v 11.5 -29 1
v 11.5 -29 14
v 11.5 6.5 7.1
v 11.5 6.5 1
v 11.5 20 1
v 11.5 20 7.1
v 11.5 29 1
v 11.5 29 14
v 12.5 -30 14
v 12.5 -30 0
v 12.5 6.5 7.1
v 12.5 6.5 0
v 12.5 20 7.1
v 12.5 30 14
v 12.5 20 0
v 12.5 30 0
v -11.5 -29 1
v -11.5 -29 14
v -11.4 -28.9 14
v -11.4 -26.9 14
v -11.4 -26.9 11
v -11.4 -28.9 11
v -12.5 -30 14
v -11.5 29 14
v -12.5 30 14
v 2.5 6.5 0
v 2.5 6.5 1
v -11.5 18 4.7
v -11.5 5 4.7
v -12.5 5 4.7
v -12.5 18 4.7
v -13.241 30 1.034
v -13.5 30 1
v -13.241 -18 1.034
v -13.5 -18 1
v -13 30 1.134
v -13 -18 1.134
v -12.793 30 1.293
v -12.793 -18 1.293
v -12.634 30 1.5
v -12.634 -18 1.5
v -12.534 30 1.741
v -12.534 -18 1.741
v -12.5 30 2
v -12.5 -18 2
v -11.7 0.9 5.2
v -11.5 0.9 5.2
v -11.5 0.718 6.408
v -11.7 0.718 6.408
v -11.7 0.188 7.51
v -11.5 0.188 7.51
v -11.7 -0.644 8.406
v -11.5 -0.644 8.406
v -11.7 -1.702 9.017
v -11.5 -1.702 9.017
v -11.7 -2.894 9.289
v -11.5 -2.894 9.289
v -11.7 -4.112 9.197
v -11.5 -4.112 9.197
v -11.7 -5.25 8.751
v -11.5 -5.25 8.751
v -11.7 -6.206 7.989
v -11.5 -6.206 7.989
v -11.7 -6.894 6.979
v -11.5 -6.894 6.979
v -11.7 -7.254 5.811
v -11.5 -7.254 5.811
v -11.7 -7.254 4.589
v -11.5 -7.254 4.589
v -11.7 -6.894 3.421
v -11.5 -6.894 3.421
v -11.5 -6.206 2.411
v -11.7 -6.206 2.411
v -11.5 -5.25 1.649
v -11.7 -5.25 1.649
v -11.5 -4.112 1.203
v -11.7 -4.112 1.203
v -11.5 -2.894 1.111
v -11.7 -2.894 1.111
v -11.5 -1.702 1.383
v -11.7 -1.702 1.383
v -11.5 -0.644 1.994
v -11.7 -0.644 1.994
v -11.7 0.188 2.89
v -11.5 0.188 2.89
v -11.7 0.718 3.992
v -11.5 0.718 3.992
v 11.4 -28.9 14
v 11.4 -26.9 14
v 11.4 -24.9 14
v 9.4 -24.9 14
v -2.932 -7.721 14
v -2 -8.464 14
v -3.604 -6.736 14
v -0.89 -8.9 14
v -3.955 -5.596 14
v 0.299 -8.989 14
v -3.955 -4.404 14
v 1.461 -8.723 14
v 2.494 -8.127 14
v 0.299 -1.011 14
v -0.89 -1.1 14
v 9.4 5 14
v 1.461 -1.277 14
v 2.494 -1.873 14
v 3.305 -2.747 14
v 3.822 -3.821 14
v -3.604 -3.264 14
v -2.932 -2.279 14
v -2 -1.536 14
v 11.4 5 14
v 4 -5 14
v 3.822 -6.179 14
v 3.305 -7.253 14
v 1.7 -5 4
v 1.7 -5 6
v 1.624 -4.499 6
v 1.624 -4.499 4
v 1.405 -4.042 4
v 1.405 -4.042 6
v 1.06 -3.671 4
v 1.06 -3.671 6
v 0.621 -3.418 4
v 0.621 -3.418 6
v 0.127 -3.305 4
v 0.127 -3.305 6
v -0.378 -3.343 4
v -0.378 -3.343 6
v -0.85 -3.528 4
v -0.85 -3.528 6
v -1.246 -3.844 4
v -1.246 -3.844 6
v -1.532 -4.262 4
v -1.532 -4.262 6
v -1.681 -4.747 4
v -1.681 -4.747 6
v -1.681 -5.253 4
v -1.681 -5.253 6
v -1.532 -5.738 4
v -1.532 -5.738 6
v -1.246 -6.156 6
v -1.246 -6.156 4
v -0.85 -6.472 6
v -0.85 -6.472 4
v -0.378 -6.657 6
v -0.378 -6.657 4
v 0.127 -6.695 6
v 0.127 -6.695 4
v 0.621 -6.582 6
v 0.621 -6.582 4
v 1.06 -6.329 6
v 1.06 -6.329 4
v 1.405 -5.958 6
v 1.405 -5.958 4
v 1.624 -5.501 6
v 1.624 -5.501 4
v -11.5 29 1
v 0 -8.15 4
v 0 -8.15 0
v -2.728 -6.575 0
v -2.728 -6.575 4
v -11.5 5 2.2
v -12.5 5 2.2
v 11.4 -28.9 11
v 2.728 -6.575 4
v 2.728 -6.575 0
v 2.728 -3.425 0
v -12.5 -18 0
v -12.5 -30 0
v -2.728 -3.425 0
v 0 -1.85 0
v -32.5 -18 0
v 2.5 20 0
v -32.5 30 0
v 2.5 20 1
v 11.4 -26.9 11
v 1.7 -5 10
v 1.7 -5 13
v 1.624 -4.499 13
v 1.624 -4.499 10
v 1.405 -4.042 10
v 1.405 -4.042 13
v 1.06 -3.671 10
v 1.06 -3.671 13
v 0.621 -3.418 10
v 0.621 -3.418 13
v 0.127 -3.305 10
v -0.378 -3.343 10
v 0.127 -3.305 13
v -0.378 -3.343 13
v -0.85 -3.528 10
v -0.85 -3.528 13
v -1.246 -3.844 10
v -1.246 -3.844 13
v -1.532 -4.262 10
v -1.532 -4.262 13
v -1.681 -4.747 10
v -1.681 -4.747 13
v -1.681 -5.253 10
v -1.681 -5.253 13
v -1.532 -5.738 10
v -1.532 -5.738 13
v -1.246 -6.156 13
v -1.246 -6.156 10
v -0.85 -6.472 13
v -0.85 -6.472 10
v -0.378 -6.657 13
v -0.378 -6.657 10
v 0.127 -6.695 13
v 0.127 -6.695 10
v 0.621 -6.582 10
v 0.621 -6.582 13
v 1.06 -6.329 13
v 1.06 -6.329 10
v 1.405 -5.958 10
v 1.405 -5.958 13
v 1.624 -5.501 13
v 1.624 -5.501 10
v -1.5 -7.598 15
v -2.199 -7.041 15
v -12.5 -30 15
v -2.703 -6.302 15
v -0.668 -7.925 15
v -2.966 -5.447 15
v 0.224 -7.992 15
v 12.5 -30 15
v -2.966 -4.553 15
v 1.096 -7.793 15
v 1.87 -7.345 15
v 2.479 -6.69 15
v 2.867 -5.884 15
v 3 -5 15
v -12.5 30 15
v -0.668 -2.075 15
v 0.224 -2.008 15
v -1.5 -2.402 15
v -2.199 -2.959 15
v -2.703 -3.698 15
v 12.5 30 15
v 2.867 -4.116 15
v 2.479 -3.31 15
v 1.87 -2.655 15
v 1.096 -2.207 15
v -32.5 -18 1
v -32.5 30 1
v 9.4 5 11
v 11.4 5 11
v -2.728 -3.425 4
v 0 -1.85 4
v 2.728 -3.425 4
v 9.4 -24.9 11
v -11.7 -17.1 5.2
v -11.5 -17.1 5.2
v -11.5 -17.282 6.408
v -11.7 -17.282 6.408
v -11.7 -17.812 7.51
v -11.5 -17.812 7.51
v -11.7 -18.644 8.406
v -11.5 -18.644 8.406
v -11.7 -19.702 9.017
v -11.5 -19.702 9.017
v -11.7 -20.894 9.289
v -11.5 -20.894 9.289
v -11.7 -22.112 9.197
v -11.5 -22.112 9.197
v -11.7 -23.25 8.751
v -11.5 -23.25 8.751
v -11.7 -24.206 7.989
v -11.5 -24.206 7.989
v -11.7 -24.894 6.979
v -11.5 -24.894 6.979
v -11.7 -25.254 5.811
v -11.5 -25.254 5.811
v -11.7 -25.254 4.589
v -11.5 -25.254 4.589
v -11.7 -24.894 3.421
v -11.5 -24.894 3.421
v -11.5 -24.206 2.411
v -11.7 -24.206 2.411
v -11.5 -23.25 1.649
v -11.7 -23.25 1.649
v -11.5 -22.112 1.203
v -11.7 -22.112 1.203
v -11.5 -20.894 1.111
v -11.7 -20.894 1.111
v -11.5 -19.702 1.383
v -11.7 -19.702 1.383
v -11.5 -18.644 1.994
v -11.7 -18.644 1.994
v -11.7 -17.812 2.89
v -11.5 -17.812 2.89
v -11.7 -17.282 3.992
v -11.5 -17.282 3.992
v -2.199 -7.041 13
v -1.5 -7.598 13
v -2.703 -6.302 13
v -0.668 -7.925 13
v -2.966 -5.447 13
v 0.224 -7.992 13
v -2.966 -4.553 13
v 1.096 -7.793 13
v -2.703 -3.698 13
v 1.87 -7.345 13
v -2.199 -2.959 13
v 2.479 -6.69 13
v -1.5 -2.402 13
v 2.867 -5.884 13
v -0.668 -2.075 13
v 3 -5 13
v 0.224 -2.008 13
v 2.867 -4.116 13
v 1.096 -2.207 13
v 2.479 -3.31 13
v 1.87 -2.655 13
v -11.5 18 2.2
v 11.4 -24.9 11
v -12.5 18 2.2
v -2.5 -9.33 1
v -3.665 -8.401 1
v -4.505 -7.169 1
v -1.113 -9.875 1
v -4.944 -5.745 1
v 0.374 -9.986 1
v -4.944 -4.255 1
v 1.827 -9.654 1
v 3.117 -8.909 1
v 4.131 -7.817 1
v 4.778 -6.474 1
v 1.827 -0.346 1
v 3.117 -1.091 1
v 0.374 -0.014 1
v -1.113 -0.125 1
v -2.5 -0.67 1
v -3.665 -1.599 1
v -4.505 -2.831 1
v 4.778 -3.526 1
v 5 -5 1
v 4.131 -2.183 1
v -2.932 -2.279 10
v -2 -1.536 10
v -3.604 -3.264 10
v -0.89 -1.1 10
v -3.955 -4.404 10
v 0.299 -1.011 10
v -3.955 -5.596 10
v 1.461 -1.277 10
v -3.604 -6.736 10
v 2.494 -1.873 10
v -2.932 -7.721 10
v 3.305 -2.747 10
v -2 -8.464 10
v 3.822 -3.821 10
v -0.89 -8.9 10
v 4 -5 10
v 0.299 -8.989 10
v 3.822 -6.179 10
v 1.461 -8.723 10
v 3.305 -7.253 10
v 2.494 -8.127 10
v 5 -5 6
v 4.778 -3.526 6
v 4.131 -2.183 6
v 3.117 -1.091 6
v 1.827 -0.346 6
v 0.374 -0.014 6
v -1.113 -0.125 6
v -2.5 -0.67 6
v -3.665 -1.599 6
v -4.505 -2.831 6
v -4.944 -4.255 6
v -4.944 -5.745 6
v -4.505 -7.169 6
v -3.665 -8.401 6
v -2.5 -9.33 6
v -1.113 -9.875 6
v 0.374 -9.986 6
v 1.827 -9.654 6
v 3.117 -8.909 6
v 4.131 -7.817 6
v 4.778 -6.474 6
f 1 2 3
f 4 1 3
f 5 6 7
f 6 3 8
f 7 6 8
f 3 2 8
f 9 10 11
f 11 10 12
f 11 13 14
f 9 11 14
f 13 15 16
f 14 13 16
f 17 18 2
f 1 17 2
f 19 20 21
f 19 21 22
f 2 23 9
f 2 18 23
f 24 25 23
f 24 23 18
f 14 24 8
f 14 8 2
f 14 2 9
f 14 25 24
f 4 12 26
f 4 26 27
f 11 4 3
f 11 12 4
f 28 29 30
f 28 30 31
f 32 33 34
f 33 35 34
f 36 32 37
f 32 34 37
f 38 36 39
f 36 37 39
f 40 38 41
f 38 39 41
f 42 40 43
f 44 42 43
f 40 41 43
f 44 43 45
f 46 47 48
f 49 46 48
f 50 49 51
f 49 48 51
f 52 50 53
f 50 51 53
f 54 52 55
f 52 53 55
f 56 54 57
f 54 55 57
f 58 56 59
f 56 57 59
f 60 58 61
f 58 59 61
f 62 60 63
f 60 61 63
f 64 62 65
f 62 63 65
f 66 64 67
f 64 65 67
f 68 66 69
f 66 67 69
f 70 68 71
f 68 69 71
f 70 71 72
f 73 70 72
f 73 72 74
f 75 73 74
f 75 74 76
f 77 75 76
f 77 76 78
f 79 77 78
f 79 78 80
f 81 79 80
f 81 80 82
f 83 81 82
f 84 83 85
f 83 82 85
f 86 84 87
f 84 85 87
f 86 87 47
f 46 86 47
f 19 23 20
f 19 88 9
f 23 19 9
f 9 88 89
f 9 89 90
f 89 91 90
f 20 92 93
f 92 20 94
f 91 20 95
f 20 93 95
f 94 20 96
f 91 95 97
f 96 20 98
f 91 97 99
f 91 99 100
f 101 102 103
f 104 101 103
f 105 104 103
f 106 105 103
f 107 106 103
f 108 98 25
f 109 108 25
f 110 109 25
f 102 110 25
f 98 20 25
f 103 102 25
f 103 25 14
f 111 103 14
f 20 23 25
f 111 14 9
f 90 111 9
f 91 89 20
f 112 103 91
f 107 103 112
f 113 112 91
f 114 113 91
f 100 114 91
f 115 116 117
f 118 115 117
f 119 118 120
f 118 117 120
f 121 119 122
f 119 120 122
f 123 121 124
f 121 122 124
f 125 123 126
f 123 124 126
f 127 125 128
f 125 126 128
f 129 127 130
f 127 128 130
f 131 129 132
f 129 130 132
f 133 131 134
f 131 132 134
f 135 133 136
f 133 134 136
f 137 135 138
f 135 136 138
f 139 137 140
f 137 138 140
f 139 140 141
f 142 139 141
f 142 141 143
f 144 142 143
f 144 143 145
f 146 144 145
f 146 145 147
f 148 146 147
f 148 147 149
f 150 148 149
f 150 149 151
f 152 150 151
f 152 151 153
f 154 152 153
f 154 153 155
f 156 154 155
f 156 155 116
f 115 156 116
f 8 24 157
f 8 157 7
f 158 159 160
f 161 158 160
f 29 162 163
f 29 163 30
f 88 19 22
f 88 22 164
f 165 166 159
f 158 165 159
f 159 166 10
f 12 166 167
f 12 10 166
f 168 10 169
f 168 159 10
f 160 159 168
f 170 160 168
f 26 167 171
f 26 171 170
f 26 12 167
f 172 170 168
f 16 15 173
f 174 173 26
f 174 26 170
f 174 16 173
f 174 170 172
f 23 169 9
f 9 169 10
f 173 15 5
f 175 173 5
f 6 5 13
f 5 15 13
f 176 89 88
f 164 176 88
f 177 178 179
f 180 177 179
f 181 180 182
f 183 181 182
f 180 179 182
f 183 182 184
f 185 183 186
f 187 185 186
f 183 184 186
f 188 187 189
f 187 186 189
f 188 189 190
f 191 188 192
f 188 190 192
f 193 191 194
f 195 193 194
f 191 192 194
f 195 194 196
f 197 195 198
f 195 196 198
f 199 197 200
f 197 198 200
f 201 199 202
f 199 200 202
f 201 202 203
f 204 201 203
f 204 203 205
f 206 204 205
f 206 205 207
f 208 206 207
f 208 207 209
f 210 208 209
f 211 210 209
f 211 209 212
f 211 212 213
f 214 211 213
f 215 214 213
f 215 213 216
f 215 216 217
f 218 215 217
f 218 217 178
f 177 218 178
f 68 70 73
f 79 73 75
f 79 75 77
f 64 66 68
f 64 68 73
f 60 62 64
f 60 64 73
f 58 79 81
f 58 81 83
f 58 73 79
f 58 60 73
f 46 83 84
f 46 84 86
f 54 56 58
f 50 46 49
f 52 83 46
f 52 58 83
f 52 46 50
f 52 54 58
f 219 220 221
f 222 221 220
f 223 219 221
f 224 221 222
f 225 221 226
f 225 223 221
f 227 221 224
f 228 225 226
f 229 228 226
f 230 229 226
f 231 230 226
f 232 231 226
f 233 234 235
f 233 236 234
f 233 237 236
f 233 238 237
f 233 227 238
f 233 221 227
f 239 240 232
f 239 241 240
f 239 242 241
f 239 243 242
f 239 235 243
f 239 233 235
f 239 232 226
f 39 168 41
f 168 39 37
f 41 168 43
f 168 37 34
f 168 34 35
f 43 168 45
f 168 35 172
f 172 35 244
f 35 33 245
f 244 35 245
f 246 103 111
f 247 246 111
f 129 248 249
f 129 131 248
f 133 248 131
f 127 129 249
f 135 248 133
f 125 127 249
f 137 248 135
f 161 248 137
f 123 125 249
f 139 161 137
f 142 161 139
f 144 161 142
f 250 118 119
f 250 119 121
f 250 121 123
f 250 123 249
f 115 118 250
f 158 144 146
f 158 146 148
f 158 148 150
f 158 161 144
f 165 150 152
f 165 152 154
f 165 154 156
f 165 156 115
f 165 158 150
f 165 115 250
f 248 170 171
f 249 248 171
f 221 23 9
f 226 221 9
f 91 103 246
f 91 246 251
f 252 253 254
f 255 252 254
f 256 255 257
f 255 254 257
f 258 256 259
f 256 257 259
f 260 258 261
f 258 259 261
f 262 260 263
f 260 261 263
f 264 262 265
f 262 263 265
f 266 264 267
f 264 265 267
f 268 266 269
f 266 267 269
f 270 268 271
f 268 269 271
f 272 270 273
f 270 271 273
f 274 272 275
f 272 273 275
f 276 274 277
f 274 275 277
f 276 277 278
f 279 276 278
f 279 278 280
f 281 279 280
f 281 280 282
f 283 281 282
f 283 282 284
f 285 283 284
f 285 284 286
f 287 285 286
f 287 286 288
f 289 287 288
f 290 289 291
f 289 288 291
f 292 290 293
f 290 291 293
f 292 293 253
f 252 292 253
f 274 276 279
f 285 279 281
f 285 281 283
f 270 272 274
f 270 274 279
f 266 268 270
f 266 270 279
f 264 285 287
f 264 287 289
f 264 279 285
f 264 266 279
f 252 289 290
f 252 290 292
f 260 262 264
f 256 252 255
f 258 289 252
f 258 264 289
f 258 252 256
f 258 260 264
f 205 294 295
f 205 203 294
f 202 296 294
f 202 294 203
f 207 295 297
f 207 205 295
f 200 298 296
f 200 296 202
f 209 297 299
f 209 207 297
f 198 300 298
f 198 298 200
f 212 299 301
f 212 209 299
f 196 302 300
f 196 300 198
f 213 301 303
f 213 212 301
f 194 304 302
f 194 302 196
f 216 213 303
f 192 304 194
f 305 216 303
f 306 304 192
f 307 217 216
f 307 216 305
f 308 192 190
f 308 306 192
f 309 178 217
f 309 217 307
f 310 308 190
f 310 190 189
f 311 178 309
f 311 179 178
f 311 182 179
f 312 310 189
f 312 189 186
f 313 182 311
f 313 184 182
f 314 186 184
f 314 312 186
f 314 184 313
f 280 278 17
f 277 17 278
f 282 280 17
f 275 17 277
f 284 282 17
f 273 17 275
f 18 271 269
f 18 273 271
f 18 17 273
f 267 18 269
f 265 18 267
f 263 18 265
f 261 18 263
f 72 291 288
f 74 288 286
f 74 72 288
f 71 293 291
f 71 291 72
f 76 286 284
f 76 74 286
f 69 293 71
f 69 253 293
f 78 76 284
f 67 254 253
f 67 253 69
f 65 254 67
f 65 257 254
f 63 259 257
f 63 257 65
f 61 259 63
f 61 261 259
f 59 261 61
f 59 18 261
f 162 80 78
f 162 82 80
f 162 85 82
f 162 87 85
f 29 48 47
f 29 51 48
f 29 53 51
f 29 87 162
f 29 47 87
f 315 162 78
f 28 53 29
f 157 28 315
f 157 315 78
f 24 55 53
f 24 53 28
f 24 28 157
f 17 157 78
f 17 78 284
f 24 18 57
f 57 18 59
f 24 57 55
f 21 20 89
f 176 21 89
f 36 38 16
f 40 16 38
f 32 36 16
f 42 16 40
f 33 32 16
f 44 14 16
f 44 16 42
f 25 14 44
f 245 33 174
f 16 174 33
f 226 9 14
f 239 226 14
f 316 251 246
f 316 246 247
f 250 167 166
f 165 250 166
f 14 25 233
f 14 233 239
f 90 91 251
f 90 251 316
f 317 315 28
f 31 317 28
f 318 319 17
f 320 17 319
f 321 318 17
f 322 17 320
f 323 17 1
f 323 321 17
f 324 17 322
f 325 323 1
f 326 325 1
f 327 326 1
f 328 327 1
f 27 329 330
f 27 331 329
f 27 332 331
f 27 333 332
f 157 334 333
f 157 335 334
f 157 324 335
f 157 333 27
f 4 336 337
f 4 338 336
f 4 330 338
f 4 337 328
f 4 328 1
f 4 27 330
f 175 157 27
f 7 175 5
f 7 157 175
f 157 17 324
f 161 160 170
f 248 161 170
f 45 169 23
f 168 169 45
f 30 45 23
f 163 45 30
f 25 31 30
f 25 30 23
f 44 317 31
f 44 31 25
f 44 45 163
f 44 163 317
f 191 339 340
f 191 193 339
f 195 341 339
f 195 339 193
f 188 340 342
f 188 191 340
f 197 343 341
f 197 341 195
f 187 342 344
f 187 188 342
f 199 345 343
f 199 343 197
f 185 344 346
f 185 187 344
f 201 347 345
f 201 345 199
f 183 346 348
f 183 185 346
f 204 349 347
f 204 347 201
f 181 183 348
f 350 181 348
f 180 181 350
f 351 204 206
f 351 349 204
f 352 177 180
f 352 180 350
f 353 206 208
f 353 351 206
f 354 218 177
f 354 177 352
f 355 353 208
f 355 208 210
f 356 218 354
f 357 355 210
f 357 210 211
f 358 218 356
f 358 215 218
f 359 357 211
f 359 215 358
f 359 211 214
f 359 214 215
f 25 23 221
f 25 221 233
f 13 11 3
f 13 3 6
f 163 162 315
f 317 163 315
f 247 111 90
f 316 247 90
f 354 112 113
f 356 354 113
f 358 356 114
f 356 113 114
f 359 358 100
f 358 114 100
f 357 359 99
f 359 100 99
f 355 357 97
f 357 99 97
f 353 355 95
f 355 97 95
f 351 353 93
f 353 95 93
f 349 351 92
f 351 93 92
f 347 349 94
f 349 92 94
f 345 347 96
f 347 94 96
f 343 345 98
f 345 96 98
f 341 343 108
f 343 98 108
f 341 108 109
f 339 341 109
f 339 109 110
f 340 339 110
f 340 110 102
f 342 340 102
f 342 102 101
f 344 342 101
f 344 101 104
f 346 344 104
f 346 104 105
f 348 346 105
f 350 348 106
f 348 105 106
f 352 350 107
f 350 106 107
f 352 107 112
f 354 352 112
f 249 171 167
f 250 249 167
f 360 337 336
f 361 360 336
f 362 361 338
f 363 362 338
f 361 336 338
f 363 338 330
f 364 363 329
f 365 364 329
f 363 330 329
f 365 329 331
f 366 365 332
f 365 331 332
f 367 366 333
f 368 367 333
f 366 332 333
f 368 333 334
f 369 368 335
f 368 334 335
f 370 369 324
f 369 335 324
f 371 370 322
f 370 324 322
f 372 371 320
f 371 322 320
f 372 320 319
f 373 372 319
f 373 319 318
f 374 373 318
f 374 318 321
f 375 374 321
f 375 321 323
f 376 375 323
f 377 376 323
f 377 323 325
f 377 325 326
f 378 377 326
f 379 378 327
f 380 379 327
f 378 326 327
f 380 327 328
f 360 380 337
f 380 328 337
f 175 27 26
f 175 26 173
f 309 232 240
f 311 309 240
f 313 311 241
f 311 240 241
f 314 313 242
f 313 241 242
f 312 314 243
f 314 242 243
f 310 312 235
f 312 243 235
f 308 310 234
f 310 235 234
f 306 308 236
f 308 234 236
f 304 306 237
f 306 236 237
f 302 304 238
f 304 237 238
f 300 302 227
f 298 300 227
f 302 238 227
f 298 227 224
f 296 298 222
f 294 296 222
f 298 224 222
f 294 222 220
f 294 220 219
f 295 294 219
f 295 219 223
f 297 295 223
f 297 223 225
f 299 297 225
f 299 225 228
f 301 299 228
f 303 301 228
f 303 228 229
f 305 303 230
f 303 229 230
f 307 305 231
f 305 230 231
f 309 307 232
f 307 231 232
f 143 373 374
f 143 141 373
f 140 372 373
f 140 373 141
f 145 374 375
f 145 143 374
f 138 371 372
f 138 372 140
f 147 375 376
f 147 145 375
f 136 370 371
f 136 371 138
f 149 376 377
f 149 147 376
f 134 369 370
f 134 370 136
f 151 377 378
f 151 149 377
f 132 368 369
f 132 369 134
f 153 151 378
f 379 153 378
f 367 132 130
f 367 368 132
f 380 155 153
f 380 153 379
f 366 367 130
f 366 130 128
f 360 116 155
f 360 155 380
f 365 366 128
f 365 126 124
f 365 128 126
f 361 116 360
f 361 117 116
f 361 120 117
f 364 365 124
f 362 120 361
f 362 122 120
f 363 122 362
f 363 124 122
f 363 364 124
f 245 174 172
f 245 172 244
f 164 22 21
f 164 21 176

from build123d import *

# Parameters (mm, degrees)
SKETCH_W        = 25
SKETCH_H        = 60
PAD_DEPTH       = 14
SKETCH001_W     = 23
SKETCH001_H     = 58
POCKET_DEPTH    = 13
SKETCH002_W     = 13
SKETCH002_H     = 2.5
POCKET001_DEPTH = 5
SKETCH003_R     = 4.1
POCKET002_DEPTH = 0.2
SKETCH004_W     = 13.5
SKETCH004_H     = 7.1
POCKET003_DEPTH = 10
SKETCH005_R     = 5
PAD001_DEPTH    = 5
SKETCH006_R     = 1.7
POCKET004_DEPTH = 6.001
POCKET005_DEPTH = 4
SKETCH013_W     = 20
SKETCH013_H     = 1
PAD005_DEPTH    = 48
FILLET_R        = 1
SKETCH008_W     = 25
SKETCH008_H     = 60
PAD002_DEPTH    = 1
SKETCH009_W     = 22.8
SKETCH009_H     = 2
SKETCH009_W_2   = 2
SKETCH009_H_2   = 29.9
PAD003_DEPTH    = 3
SKETCH010_R     = 4
PAD004_DEPTH    = 4
SKETCH011_R     = 3
POCKET006_DEPTH = 2
SKETCH012_R     = 1.7
POCKET007_DEPTH = 5


with BuildPart() as bottom:
    # Sketch → Pad (new body)
    with BuildSketch(Plane.XY):
        Rectangle(SKETCH_W, SKETCH_H)
    extrude(amount=PAD_DEPTH)

    # Sketch001 (on Face6 of Pad) → Pocket (cut)
    with BuildSketch(Plane.XY.offset(14)):
        Rectangle(SKETCH001_W, SKETCH001_H)
    extrude(amount=-POCKET_DEPTH, mode=Mode.SUBTRACT)

    # Sketch002 (on Face7 of Pocket) → Pocket001 (cut)
    with BuildSketch(Plane.YZ.offset(-11.5)):
        with Locations((11.5, 3.45)):
            Rectangle(SKETCH002_W, SKETCH002_H)
    extrude(amount=-POCKET001_DEPTH, mode=Mode.SUBTRACT)

    # Sketch003 (on Face11 of Pocket001) → Pocket002 (cut)
    with BuildSketch(Plane.YZ.offset(-11.5)):
        with Locations((-3.2, 5.2)):
            Circle(SKETCH003_R)
        with Locations((-21.2, 5.2)):
            Circle(SKETCH003_R)
    extrude(amount=-POCKET002_DEPTH, mode=Mode.SUBTRACT)

    # Sketch004 (on Face3 of Pocket002) → Pocket003 (cut)
    with BuildSketch(Plane.YZ.offset(12.5)):
        with Locations((13.25, 3.55)):
            Rectangle(SKETCH004_W, SKETCH004_H)
    extrude(amount=-POCKET003_DEPTH, mode=Mode.SUBTRACT)

    # Sketch005 (on Face19 of Pocket003) → Pad001 (join)
    with BuildSketch(Plane.XY.offset(1)):
        with Locations((0, -5)):
            Circle(SKETCH005_R)
    extrude(amount=PAD001_DEPTH)

    # Sketch006 (on Face25 of Pad001) → Pocket004 (cut, through all)
    with BuildSketch(Plane.XY.offset(6)):
        with Locations((0, -5)):
            Circle(SKETCH006_R)
    extrude(amount=-POCKET004_DEPTH, mode=Mode.SUBTRACT)

    # Sketch007 (on Face4 of Pocket004) → Pocket005 (cut)
    with BuildSketch(Plane(origin=(0, 0, 0), x_dir=(1, 0, 0), z_dir=(0, 0, -1))):
        Polygon((2.72798, 6.575), (0, 8.15), (-2.72798, 6.575), (-2.72798, 3.425), (0, 1.85), (2.72798, 3.425), align=None)
    extrude(amount=-POCKET005_DEPTH, mode=Mode.SUBTRACT)

    # Sketch013 (on Face6 of Pocket005) → Pad005 (join)
    with BuildSketch(Plane(origin=(0, 30, 0), x_dir=(-1, 0, 0), z_dir=(0, 1, 0))):
        with Locations((22.5, 0.5)):
            Rectangle(SKETCH013_W, SKETCH013_H)
    extrude(amount=-PAD005_DEPTH)

    # Fillet
    fillet_edges = [bottom.edges().sort_by_distance(p)[0] for p in [
        (-12.5, 6, 1),
    ]]
    fillet(fillet_edges, radius=FILLET_R)


with BuildPart() as top:
    # Sketch008 → Pad002 (new body)
    with BuildSketch(Plane.XY.offset(14)):
        Rectangle(SKETCH008_W, SKETCH008_H)
    extrude(amount=PAD002_DEPTH)

    # Sketch009 (on Face5 of Pad002) → Pad003 (join)
    with BuildSketch(Plane(origin=(0, 0, 14), x_dir=(1, 0, 0), z_dir=(0, 0, -1))):
        with Locations((0, 27.9)):
            Rectangle(SKETCH009_W, SKETCH009_H)
        with Locations((10.4, 9.95)):
            Rectangle(SKETCH009_W_2, SKETCH009_H_2)
    extrude(amount=PAD003_DEPTH)

    # Sketch010 (on Face4 of Pad003) → Pad004 (join)
    with BuildSketch(Plane(origin=(0, 0, 14), x_dir=(1, 0, 0), z_dir=(0, 0, -1))):
        with Locations((0, 5)):
            Circle(SKETCH010_R)
    extrude(amount=PAD004_DEPTH)

    # Sketch011 (on Face5 of Pad004) → Pocket006 (cut)
    with BuildSketch(Plane.XY.offset(15)):
        with Locations((0, -5)):
            Circle(SKETCH011_R)
    extrude(amount=-POCKET006_DEPTH, mode=Mode.SUBTRACT)

    # Sketch012 (on Face20 of Pocket006) → Pocket007 (cut)
    with BuildSketch(Plane.XY.offset(13)):
        with Locations((0, -5)):
            Circle(SKETCH012_R)
    extrude(amount=-POCKET007_DEPTH, mode=Mode.SUBTRACT)


solid = Compound([bottom.part, top.part])
